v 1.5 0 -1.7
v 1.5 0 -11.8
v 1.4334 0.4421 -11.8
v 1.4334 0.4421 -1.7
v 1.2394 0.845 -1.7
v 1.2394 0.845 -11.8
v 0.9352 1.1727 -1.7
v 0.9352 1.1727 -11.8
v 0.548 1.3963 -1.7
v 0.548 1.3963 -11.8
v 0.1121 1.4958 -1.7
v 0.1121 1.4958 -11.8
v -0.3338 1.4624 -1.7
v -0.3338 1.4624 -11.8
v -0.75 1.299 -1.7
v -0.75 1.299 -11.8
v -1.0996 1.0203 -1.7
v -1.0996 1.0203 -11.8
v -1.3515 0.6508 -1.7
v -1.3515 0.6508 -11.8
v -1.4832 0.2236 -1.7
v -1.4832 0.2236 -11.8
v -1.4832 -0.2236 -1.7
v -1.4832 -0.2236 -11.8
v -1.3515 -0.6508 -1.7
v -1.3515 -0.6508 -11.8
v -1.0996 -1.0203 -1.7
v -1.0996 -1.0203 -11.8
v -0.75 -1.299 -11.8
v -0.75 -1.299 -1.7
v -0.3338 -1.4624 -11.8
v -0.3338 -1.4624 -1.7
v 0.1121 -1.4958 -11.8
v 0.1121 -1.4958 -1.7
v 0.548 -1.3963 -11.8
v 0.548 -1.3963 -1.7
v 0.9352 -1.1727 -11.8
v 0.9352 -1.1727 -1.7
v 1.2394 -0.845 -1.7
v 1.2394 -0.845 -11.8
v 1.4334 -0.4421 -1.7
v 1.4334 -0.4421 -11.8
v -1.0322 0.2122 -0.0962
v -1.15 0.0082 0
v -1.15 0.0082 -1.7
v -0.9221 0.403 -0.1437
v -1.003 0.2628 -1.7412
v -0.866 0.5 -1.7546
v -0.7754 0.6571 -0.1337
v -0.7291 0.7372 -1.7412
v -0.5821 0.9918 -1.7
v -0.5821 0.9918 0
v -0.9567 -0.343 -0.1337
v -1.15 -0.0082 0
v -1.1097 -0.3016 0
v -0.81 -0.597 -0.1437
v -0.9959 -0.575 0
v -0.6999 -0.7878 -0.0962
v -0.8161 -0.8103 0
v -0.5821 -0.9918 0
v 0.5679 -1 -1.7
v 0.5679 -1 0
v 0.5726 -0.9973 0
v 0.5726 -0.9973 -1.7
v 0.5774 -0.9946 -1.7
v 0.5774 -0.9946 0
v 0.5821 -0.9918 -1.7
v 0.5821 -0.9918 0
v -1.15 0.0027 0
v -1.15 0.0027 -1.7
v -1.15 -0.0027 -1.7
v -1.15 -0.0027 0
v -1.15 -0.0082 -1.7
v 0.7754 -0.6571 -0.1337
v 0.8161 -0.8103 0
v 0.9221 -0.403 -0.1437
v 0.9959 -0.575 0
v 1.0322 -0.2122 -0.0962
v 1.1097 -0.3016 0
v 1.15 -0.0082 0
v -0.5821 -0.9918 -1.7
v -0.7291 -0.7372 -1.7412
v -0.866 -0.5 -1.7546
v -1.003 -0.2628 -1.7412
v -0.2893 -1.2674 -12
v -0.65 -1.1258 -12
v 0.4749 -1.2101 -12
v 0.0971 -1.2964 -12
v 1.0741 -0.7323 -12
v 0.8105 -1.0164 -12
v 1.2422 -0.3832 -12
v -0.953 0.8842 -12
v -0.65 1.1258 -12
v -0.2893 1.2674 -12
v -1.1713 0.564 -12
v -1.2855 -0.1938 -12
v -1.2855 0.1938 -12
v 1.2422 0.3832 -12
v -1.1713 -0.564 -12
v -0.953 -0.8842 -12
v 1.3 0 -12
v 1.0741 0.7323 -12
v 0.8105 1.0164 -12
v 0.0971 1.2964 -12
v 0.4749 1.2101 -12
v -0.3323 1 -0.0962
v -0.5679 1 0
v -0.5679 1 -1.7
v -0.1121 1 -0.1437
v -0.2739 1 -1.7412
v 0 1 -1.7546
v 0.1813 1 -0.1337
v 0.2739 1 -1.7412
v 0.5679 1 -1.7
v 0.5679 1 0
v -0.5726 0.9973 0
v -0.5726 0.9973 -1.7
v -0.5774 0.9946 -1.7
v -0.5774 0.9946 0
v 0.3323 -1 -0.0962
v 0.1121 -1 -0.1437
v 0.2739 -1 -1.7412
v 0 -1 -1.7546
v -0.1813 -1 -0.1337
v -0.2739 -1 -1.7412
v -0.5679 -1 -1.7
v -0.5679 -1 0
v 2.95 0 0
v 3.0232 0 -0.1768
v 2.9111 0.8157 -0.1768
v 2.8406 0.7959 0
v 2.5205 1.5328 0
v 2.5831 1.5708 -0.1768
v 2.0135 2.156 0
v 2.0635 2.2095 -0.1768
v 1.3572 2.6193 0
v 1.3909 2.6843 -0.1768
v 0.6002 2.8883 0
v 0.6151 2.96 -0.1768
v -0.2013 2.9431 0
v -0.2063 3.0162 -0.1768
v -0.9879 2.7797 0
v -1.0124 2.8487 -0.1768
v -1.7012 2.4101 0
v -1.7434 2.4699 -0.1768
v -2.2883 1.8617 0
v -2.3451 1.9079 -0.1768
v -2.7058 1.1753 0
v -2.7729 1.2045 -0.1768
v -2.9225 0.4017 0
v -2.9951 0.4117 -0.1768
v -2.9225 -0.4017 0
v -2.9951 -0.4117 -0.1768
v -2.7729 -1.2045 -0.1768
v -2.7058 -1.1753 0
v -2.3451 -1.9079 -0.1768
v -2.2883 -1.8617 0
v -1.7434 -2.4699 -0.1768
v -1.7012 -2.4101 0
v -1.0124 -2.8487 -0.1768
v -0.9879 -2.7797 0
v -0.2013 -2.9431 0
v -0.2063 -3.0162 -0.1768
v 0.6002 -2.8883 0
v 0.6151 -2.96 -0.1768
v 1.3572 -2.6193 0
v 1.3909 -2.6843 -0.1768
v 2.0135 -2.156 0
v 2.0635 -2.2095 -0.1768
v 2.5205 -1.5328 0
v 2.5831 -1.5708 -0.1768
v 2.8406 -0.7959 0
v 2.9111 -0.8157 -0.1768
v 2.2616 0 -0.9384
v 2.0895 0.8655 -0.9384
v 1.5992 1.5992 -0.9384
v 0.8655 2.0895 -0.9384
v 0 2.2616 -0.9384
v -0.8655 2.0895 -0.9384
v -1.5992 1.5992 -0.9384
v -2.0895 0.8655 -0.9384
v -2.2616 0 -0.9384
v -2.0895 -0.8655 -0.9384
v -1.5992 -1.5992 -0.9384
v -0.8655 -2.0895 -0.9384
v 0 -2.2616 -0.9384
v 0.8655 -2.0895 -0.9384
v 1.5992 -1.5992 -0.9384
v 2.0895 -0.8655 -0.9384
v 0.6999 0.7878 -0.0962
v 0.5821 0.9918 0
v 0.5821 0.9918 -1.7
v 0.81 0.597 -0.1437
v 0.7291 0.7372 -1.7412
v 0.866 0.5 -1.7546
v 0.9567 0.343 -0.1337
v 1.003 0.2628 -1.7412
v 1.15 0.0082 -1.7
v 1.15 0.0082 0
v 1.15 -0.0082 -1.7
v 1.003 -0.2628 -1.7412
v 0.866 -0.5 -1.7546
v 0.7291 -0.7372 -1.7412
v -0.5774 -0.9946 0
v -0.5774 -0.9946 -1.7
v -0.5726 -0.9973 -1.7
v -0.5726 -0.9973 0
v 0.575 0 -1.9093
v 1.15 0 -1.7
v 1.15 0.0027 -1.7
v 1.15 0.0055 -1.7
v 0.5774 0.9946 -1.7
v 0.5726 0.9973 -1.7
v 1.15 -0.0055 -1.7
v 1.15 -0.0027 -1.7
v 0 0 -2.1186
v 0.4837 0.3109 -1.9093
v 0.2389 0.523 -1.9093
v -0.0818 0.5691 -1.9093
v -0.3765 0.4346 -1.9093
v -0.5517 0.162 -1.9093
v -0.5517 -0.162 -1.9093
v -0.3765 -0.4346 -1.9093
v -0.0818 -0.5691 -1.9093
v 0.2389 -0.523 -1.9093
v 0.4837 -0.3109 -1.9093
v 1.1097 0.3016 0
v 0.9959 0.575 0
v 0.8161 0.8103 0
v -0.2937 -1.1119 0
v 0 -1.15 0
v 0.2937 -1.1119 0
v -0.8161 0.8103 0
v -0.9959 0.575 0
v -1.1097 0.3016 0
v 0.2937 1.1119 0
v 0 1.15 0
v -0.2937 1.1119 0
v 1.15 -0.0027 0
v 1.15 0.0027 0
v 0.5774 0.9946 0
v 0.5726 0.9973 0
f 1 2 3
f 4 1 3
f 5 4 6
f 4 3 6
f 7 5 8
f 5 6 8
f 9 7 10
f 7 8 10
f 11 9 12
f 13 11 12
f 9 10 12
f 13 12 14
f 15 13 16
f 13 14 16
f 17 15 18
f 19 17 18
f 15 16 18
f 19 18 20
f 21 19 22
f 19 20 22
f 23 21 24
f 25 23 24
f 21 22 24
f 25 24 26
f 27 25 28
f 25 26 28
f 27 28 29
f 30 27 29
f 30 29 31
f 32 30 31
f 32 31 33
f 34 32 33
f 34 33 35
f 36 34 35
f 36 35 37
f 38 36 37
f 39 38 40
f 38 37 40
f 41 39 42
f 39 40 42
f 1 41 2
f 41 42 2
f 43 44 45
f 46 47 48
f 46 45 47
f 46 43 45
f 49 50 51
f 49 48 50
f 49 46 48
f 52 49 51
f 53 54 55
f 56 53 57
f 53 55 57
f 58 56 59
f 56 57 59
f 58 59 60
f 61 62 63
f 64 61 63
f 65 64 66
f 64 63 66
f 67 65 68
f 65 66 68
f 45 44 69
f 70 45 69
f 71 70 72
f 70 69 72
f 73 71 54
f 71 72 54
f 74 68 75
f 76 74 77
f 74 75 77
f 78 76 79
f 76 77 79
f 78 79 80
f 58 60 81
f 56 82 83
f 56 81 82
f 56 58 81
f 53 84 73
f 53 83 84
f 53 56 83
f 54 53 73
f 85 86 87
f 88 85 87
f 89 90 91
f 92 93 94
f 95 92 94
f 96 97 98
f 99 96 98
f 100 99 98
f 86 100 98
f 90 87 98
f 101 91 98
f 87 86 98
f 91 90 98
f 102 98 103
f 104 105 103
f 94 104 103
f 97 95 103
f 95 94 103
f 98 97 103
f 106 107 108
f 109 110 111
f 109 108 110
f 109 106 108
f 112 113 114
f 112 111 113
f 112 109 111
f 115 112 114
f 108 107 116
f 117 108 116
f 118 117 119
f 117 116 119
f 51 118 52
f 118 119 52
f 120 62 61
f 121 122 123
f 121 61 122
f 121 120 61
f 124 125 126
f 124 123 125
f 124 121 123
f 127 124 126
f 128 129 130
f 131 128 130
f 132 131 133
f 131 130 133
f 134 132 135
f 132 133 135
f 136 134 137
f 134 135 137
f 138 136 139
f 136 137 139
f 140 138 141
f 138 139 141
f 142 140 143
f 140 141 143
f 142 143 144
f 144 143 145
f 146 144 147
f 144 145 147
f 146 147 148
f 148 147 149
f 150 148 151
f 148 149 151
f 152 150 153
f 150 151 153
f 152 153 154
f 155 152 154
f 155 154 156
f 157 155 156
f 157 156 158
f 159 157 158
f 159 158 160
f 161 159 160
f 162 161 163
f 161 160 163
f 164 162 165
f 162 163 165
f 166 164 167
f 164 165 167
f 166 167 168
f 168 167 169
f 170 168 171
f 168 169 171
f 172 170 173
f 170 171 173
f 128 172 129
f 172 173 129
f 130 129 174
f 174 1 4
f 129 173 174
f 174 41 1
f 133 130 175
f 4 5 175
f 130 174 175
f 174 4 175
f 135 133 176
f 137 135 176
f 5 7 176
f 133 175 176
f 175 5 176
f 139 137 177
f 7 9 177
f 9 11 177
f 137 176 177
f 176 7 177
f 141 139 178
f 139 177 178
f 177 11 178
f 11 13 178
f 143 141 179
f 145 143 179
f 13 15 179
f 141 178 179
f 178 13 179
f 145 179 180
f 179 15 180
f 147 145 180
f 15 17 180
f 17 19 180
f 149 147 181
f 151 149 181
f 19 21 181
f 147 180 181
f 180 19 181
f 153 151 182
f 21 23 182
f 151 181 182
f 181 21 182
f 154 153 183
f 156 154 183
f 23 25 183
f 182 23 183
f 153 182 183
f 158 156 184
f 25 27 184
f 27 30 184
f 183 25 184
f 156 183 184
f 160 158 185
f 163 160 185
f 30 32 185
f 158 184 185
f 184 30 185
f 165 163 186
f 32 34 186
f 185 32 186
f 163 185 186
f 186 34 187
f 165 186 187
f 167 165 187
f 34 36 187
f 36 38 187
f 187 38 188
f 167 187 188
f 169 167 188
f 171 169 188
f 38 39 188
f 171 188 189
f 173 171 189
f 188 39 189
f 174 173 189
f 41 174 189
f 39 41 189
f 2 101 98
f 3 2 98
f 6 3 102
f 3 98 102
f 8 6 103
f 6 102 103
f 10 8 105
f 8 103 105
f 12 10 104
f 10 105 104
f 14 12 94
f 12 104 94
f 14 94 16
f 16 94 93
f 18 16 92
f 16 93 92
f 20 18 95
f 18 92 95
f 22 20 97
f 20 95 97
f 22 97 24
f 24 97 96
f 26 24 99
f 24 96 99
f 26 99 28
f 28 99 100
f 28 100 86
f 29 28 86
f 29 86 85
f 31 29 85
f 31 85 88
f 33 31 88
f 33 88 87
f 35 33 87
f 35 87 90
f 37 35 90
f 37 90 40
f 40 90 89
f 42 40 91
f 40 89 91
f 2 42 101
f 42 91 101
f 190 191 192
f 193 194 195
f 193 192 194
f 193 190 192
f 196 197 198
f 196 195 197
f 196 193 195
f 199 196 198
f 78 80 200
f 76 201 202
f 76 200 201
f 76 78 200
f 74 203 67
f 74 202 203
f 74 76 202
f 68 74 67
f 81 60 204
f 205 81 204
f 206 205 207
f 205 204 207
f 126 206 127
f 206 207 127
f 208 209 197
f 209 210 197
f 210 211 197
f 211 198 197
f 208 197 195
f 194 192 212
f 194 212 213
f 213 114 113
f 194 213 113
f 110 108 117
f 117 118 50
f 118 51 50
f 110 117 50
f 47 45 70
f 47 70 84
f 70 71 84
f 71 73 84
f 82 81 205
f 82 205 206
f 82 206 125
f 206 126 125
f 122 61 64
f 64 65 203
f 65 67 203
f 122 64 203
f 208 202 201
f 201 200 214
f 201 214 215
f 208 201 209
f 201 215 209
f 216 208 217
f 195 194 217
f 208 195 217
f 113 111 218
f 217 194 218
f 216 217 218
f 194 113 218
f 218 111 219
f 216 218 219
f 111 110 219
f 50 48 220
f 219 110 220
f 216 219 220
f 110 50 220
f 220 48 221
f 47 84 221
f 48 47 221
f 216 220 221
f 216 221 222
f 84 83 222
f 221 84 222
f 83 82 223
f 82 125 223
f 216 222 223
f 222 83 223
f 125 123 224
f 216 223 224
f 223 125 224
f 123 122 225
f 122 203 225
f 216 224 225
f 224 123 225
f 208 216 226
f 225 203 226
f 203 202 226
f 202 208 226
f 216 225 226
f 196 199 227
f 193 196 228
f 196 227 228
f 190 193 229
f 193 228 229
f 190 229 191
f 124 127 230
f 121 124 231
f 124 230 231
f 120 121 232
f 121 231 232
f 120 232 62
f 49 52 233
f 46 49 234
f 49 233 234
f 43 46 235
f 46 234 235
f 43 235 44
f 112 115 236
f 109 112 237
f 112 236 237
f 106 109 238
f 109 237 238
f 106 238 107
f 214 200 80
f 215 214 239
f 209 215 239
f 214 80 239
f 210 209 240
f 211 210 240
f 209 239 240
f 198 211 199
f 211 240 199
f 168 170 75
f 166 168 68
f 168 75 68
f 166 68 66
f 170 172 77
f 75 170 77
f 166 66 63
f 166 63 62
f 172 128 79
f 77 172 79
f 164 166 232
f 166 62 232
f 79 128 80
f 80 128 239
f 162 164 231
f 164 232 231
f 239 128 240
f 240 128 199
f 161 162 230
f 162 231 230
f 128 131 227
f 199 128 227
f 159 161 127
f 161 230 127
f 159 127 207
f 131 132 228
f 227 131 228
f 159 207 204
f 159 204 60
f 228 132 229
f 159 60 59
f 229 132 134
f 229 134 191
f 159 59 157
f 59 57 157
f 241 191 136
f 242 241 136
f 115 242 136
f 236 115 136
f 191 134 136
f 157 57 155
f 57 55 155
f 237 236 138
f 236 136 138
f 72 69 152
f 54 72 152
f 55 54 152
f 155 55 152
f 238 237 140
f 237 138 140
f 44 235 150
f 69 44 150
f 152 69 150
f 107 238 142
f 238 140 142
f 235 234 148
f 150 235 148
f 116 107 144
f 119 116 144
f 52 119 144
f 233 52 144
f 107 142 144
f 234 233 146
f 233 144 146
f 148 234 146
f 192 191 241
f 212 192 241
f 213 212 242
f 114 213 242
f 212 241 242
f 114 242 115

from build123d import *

# Parameters (mm, degrees)
SKETCH001_R     = 2.15
POCKET_DEPTH    = 3.119566
CHAMFER_SIZE    = 0.25
CHAMFER001_SIZE = 0.2


with BuildPart() as pocket:
    # Sketch003 → Revolution001 (revolve)
    with BuildSketch(Plane.XZ):
        Polygon((0, -2.118566), (1.15, -1.7), (1.15, 1), (0, 1), align=None)
    revolve(axis=Axis((0, 0, 0), (0, 0, 1)))

    # Sketch001 → Pocket (cut, through all)
    with BuildSketch(Plane(origin=(0, 0, 1), x_dir=(-1, 0, 0), z_dir=(0, 0, 1))):
        Circle(SKETCH001_R)
        Polygon((-0.57735, 1), (0.57735, 1), (1.154701, 0), (0.57735, -1), (-0.57735, -1), (-1.154701, 0), align=None, mode=Mode.SUBTRACT)
    extrude(amount=-POCKET_DEPTH, mode=Mode.SUBTRACT)


with BuildPart() as chamfer001:
    # Sketch → Revolution (revolve)
    with BuildSketch(Plane.XZ):
        Polygon((1.15, 0), (3.199999, 0), (1.5, -1.7), (1.5, -12), (0, -12), (0, -1.150001), align=None)
    revolve(axis=Axis((0, 0, 0), (0, 0, 1)))

    # Cut: cut Pocket
    add(pocket.part, mode=Mode.SUBTRACT)

    # Chamfer
    chamfer_edges = [chamfer001.edges().sort_by_distance(p)[0] for p in [
        (-3.199999, 0, 0),
    ]]
    chamfer(chamfer_edges, length=CHAMFER_SIZE)

    # Chamfer001
    chamfer001_edges = [chamfer001.edges().sort_by_distance(p)[0] for p in [
        (-1.5, 0, -12),
    ]]
    chamfer(chamfer001_edges, length=CHAMFER001_SIZE)


solid = chamfer001.part
